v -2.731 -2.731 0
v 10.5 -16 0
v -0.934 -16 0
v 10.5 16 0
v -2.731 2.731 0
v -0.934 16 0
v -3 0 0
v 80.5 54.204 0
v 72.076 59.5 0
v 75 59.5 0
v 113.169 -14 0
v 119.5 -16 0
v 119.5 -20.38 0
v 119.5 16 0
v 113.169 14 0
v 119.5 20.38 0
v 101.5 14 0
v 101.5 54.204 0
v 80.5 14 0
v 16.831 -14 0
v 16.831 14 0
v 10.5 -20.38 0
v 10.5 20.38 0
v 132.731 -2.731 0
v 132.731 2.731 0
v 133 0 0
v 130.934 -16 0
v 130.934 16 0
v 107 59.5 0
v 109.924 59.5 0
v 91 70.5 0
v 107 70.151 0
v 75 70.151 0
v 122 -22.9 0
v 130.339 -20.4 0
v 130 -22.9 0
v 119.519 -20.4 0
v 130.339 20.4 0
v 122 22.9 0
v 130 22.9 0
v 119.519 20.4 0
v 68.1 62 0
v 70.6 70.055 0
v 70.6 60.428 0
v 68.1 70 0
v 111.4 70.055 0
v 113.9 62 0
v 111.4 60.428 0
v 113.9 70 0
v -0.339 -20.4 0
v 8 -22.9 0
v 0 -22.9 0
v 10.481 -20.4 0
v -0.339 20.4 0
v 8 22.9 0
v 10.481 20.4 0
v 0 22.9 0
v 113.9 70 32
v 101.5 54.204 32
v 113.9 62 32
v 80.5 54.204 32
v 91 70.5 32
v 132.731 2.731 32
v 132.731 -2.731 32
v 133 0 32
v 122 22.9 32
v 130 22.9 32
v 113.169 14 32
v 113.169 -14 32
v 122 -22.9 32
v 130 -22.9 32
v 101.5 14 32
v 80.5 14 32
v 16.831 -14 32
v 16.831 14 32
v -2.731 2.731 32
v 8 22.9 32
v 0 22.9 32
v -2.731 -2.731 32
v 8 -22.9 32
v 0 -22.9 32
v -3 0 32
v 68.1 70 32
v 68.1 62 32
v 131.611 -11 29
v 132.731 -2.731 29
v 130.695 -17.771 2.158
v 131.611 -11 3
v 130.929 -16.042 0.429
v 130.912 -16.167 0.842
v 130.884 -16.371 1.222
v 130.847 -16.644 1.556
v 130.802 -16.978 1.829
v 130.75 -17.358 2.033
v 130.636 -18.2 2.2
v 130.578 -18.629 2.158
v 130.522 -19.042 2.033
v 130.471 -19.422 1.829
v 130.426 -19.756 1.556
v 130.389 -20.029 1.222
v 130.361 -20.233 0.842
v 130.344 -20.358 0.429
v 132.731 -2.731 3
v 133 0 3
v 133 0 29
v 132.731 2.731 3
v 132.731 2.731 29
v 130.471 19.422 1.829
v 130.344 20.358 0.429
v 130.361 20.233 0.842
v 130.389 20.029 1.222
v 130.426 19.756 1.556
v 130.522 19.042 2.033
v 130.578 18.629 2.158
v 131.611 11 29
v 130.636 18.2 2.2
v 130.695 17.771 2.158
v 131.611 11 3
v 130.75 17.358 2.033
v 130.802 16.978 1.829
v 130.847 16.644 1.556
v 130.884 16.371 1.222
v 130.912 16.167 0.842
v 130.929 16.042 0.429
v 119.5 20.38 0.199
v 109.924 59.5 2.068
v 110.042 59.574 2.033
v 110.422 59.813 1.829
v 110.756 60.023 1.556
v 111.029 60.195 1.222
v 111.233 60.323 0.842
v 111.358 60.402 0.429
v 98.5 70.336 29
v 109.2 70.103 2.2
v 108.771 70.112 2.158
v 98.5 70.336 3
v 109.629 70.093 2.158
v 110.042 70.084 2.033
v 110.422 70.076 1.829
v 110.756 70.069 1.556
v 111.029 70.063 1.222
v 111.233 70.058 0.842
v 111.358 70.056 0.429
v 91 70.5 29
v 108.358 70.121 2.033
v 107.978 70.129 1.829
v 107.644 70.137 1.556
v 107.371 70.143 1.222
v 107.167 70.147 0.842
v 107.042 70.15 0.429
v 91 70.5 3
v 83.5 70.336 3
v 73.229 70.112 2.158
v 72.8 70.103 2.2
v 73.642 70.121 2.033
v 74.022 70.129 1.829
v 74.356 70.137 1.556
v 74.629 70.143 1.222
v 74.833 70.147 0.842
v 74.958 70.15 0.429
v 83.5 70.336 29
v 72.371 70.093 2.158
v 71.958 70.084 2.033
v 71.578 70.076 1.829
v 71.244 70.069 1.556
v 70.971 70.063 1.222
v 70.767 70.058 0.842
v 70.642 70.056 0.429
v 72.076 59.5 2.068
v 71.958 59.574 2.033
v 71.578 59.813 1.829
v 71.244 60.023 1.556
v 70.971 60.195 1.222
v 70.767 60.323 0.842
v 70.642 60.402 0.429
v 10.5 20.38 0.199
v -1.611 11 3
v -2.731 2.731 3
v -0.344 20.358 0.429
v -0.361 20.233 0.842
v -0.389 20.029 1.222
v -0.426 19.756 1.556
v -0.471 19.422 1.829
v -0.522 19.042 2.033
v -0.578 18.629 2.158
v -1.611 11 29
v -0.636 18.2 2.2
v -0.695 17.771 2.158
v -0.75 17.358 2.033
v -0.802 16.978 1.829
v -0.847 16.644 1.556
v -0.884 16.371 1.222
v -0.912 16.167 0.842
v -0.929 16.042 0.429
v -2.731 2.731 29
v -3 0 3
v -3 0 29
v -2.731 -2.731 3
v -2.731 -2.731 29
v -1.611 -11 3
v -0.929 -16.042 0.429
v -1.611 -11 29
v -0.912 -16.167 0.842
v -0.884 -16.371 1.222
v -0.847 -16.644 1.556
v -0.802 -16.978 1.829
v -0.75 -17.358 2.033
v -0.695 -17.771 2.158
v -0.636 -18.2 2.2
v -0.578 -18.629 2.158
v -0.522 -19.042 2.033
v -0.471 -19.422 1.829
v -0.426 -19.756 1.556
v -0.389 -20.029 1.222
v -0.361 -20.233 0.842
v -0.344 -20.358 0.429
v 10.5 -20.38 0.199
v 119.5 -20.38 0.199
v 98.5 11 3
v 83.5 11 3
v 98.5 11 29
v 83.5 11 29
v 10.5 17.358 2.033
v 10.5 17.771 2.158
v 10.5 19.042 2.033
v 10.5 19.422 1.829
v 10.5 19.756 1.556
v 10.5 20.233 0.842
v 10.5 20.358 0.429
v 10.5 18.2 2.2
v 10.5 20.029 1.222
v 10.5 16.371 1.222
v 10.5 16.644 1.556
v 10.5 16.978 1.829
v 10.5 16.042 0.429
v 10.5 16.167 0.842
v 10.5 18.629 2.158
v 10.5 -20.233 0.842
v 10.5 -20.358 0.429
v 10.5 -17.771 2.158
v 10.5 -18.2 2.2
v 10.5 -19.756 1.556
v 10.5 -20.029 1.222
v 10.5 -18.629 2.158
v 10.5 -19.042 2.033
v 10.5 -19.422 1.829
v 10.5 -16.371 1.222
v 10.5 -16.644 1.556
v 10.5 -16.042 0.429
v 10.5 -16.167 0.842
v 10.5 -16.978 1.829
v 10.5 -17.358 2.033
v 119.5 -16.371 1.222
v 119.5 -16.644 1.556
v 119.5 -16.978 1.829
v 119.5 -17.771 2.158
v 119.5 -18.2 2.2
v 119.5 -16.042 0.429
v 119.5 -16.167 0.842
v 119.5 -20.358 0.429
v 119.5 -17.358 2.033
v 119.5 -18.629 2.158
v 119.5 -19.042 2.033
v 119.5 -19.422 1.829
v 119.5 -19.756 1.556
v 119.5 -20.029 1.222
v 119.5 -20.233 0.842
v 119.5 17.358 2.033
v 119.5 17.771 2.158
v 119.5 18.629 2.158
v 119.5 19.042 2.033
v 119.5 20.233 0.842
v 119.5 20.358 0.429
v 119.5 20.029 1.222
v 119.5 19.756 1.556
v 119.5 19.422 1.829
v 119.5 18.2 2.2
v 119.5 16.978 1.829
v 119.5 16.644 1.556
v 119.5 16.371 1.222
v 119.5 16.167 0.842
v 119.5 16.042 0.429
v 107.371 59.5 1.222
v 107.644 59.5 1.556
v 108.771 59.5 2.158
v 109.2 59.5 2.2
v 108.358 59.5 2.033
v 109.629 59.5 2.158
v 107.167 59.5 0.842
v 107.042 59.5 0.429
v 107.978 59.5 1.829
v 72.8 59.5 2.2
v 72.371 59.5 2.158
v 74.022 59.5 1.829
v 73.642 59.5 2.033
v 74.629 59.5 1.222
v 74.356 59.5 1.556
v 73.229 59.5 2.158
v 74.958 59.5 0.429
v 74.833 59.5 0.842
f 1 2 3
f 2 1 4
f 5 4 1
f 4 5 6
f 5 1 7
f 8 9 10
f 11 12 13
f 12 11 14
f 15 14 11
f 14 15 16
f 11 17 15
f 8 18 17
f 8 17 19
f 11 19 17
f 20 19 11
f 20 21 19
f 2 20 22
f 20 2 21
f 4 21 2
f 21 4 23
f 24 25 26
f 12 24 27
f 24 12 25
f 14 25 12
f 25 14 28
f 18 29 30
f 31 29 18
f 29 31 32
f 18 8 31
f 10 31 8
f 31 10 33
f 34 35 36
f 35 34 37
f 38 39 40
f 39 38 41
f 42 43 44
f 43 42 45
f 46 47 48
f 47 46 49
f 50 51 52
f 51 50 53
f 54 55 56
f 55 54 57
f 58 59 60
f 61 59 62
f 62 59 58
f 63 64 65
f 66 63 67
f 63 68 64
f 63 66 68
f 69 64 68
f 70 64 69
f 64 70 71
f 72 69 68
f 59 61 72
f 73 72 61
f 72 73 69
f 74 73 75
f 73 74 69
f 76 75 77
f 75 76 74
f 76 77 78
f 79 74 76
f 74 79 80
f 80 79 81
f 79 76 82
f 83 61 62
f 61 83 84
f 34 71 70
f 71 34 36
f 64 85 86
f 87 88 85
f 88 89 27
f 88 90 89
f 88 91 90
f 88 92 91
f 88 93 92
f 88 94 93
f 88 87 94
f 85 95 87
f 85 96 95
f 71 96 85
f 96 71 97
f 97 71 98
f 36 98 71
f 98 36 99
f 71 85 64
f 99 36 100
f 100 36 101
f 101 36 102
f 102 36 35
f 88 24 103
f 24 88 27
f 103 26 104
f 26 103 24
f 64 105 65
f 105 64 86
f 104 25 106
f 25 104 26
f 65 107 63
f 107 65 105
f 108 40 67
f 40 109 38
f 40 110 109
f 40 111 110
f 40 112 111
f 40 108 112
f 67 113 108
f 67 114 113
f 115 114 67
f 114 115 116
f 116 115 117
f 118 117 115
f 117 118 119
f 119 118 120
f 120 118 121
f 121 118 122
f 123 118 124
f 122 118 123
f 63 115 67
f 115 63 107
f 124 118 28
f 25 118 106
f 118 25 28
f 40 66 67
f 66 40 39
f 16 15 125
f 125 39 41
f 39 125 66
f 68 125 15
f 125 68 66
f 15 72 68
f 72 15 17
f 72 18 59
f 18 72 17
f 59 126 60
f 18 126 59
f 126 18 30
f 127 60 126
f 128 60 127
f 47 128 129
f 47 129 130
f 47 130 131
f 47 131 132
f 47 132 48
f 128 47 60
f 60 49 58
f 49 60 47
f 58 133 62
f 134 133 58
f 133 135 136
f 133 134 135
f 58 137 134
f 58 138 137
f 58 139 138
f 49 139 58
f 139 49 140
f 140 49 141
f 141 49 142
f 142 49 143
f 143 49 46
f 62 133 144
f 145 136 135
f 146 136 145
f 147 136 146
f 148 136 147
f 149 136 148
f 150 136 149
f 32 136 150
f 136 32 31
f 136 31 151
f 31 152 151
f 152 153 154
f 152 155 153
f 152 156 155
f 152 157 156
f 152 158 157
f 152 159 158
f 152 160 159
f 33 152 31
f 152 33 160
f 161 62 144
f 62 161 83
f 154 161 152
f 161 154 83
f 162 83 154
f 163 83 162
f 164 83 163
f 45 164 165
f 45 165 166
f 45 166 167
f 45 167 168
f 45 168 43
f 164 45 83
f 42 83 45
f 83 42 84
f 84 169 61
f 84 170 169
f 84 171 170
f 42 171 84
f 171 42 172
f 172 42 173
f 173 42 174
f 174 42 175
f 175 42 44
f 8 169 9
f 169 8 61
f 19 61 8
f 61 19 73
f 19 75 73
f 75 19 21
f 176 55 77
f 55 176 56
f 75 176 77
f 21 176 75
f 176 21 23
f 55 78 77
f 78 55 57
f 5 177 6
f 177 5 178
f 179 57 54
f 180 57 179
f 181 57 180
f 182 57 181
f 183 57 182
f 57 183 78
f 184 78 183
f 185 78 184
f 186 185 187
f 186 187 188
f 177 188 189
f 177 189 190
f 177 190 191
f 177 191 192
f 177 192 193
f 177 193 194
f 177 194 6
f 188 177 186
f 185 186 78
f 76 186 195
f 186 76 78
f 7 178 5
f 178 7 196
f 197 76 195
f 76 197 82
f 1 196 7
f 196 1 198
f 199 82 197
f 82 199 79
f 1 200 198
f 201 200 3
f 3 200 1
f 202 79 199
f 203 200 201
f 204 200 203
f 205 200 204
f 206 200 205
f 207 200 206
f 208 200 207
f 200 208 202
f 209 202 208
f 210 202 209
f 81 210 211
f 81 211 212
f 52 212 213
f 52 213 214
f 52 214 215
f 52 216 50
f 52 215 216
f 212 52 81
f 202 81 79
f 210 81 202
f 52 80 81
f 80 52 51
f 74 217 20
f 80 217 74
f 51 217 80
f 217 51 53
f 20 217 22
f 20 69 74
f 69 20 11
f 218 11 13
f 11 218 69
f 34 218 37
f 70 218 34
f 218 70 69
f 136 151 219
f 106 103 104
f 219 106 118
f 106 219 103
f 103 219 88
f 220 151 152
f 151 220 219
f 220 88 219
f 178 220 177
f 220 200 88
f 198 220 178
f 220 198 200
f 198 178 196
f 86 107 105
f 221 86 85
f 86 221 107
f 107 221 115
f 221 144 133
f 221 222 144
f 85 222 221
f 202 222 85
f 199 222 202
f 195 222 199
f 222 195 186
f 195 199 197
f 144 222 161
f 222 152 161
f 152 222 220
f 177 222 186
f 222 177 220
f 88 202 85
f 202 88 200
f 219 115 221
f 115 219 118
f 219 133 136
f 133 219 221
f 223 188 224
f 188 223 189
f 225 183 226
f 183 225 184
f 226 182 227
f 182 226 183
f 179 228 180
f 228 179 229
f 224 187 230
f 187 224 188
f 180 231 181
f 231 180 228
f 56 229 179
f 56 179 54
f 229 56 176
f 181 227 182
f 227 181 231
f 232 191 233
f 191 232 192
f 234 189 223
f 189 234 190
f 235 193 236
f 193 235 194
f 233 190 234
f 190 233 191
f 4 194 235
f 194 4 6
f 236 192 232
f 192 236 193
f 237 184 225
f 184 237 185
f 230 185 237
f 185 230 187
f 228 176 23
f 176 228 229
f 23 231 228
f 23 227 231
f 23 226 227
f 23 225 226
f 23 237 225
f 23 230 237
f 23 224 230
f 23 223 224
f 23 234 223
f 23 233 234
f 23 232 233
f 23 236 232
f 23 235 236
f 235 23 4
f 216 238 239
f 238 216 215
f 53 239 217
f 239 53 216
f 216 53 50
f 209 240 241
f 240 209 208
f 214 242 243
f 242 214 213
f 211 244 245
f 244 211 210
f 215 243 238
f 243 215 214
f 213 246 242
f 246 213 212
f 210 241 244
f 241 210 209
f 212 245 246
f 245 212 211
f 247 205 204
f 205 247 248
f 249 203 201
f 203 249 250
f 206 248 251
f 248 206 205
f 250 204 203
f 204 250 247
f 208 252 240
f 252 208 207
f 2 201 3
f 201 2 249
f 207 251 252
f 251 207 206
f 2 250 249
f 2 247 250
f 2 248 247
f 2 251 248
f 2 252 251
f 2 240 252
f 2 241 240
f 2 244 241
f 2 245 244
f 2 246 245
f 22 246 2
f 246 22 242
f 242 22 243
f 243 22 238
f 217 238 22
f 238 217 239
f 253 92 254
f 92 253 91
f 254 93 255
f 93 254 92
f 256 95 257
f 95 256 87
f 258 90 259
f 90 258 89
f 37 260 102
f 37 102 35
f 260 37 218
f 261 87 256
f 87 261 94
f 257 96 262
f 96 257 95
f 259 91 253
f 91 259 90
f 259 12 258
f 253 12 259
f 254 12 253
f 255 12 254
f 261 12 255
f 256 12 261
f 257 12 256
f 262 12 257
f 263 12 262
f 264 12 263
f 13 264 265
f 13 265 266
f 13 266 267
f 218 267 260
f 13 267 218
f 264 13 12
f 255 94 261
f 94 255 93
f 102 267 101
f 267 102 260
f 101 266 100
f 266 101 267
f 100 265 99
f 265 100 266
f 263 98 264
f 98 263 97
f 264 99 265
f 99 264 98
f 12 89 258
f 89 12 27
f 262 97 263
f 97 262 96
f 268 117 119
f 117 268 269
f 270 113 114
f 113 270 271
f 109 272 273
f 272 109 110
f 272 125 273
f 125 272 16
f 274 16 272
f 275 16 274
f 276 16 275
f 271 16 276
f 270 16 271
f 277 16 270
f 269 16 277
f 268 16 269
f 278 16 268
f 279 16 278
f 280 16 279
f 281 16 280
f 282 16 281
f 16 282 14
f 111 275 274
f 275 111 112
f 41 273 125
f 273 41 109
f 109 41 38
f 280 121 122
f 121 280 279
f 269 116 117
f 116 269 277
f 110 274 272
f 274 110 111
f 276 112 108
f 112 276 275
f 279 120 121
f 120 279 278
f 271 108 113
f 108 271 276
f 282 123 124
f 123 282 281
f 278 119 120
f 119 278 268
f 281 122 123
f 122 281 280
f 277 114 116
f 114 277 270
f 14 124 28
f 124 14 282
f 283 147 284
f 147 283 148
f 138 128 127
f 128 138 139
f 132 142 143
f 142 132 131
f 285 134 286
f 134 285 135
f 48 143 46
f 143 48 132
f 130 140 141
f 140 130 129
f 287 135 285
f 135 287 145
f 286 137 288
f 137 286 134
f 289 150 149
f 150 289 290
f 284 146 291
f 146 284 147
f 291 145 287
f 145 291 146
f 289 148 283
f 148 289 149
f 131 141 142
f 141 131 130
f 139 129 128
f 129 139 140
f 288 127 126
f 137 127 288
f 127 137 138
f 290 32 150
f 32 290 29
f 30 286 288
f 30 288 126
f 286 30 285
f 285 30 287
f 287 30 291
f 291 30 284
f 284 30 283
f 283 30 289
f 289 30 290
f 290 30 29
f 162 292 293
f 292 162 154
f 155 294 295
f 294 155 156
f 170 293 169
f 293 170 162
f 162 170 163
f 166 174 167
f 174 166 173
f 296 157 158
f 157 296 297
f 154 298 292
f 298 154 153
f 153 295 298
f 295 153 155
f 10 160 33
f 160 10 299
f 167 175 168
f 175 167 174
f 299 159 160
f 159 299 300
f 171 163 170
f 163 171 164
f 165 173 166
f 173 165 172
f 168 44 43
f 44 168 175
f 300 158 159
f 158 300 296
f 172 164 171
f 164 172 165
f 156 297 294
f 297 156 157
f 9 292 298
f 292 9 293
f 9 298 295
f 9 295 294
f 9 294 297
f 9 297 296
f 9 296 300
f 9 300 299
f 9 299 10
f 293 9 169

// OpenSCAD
$fn = 32;

// ----------------------------------------------------------------------
// Air duct: 28 mm duct, 3 mm wall, 32 mm across
// ----------------------------------------------------------------------

// --- parameters (mm) ---
duct_r = 14;              // duct core radius
duct_d = 28;              // duct core diameter
wall = 3;                 // duct wall thickness
height = 32;              // duct width (extrusion height)
port_r = 22.9;            // port flange half width
port_d = 45.8;            // port flange width
port_t = 8;               // port flange thickness
bolt_d = 4.4;             // port bolt holes
bolt_offset = 18.2;       // bolt hole offset from the port axis
branch_r = 10.5;          // branch core radius
branch_d = 21;            // branch core diameter
branch_len = 70;          // branch length from the run axis

difference() {
  /* outer hull chain: tube with a flat flange plate at every port */
  linear_extrude(height = 32) {
    hull() {
      polygon([[0, -22.9], [0, 22.9], [8, 22.9], [8, -22.9]]);
      translate([11, 0]) circle(r = 14);
    }
    hull() {
      translate([11, 0]) circle(r = 14);
      translate([39, 0]) circle(r = 14);
    }
    hull() {
      translate([39, 0]) circle(r = 14);
      translate([91, 0]) circle(r = 14);
    }
    hull() {
      translate([91, 0]) circle(r = 14);
      translate([119, 0]) circle(r = 14);
    }
    hull() {
      translate([119, 0]) circle(r = 14);
      polygon([[130, 22.9], [130, -22.9], [122, -22.9], [122, 22.9]]);
    }
    hull() {
      translate([91, 0]) circle(r = 10.5);
      translate([91, 38.5]) circle(r = 10.5);
    }
    hull() {
      translate([91, 38.5]) circle(r = 10.5);
      translate([91, 60]) circle(r = 10.5);
    }
    hull() {
      translate([91, 60]) circle(r = 10.5);
      polygon([[68.1, 70], [113.9, 70], [113.9, 62], [68.1, 62]]);
    }
  }
  /* air passage: the same chain inset by the wall, 5 mm proud of the ports */
  translate([0, 0, 3]) linear_extrude(height = 26) {
    hull() {
      translate([-5, 0]) circle(r = 11);
      translate([39, 0]) circle(r = 11);
    }
    hull() {
      translate([39, 0]) circle(r = 11);
      translate([91, 0]) circle(r = 11);
    }
    hull() {
      translate([91, 0]) circle(r = 11);
      translate([135, 0]) circle(r = 11);
    }
    hull() {
      translate([91, 0]) circle(r = 7.5);
      translate([91, 38.5]) circle(r = 7.5);
    }
    hull() {
      translate([91, 38.5]) circle(r = 7.5);
      translate([91, 75]) circle(r = 7.5);
    }
  }
  translate([0, 0]) rotate([0, 0, -90]) translate([-18.2, -2.5]) rotate([-90, 0, 0]) cylinder(h = 13, d = 4.4);
  translate([0, 0]) rotate([0, 0, -90]) translate([18.2, -2.5]) rotate([-90, 0, 0]) cylinder(h = 13, d = 4.4);
  translate([130, 0]) rotate([0, 0, 90]) translate([-18.2, -2.5]) rotate([-90, 0, 0]) cylinder(h = 13, d = 4.4);
  translate([130, 0]) rotate([0, 0, 90]) translate([18.2, -2.5]) rotate([-90, 0, 0]) cylinder(h = 13, d = 4.4);
  translate([91, 70]) rotate([0, 0, 180]) translate([-18.2, -2.5]) rotate([-90, 0, 0]) cylinder(h = 13, d = 4.4);
  translate([91, 70]) rotate([0, 0, 180]) translate([18.2, -2.5]) rotate([-90, 0, 0]) cylinder(h = 13, d = 4.4);
}
